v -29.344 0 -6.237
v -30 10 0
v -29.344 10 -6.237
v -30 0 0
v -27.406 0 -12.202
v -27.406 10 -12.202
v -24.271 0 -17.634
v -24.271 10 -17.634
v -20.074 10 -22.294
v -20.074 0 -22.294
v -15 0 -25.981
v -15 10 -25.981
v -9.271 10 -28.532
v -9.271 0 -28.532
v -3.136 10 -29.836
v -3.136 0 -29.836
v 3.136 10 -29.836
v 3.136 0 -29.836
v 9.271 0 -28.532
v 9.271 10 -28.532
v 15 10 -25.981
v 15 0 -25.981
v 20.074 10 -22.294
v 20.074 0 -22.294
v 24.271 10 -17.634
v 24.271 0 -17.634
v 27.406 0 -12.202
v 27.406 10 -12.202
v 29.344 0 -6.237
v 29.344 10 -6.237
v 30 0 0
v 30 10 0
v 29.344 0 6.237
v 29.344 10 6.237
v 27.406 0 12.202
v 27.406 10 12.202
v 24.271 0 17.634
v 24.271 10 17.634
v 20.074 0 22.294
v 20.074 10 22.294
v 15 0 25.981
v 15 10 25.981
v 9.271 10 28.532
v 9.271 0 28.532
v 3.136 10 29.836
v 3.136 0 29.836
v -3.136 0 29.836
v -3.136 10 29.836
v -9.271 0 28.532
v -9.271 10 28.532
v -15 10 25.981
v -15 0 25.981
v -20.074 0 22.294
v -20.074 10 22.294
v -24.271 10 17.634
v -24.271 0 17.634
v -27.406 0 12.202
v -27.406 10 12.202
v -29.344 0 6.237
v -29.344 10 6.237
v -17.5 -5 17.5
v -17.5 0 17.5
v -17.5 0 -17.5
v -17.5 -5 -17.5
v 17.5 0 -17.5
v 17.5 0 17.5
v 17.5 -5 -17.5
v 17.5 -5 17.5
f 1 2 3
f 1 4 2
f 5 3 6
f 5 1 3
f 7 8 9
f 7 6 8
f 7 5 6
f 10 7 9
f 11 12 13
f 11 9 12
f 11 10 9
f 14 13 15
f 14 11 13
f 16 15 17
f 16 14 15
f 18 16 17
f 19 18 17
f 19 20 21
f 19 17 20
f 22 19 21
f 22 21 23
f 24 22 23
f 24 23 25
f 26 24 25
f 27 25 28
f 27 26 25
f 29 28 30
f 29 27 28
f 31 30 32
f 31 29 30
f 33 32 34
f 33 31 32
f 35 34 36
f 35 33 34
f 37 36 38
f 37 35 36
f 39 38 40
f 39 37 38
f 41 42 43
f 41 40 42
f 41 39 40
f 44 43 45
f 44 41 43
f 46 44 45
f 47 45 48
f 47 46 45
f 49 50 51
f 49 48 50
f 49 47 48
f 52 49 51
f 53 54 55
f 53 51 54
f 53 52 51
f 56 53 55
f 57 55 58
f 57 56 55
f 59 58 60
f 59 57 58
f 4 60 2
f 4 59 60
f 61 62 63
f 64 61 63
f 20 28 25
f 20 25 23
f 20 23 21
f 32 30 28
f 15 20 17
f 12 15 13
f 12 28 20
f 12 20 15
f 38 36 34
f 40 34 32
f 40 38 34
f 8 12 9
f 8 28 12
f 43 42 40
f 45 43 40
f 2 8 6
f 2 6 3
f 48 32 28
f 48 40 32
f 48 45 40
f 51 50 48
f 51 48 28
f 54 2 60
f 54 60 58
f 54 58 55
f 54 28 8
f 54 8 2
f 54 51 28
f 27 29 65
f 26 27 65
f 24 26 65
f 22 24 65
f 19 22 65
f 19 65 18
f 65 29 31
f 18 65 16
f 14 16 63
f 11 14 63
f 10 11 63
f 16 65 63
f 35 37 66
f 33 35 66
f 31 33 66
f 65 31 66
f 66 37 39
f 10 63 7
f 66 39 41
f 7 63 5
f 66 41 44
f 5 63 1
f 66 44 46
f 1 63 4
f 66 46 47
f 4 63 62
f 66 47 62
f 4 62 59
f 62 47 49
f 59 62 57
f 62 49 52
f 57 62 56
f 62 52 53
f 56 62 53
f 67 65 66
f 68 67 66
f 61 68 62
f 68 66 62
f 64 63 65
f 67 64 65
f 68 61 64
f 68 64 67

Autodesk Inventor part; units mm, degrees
ref_plane "YZ Plane" through (0, 0, 0) normal (1, 0, 0) x (0, 1, 0)
ref_plane "XZ Plane" through (0, 0, 0) normal (0, 1, 0) x (-1, 0, 0)
ref_plane "XY Plane" through (0, 0, 0) normal (0, 0, 1) x (1, 0, 0)
sketch "草图1" plane through (0, 0, 0) normal (0, 1, 0) x (-1, 0, 0)
  circle A0 centre (0, 0) radius 30
  dimension "d0" = 60
extrude "拉伸1" add sketch "草图1" along normal blind 10
sketch "草图2" plane through (0, 0, 0) normal (0, -1, 0) x (1, 0, 0)
  line L0 (-17.5, -17.5) -> (17.5, -17.5)
  line L1 (17.5, -17.5) -> (17.5, 17.5)
  line L2 (17.5, 17.5) -> (-17.5, 17.5)
  line L3 (-17.5, 17.5) -> (-17.5, -17.5)
  line L4 (-17.5, -17.5) -> (17.5, 17.5) construction
  line L5 (17.5, -17.5) -> (-17.5, 17.5) construction
  point P0 (0, 0)
  dimension "d3" = 35
  dimension "d4" = 35
extrude "拉伸2" add sketch "草图2" along normal blind 5
properties part number "底座"
